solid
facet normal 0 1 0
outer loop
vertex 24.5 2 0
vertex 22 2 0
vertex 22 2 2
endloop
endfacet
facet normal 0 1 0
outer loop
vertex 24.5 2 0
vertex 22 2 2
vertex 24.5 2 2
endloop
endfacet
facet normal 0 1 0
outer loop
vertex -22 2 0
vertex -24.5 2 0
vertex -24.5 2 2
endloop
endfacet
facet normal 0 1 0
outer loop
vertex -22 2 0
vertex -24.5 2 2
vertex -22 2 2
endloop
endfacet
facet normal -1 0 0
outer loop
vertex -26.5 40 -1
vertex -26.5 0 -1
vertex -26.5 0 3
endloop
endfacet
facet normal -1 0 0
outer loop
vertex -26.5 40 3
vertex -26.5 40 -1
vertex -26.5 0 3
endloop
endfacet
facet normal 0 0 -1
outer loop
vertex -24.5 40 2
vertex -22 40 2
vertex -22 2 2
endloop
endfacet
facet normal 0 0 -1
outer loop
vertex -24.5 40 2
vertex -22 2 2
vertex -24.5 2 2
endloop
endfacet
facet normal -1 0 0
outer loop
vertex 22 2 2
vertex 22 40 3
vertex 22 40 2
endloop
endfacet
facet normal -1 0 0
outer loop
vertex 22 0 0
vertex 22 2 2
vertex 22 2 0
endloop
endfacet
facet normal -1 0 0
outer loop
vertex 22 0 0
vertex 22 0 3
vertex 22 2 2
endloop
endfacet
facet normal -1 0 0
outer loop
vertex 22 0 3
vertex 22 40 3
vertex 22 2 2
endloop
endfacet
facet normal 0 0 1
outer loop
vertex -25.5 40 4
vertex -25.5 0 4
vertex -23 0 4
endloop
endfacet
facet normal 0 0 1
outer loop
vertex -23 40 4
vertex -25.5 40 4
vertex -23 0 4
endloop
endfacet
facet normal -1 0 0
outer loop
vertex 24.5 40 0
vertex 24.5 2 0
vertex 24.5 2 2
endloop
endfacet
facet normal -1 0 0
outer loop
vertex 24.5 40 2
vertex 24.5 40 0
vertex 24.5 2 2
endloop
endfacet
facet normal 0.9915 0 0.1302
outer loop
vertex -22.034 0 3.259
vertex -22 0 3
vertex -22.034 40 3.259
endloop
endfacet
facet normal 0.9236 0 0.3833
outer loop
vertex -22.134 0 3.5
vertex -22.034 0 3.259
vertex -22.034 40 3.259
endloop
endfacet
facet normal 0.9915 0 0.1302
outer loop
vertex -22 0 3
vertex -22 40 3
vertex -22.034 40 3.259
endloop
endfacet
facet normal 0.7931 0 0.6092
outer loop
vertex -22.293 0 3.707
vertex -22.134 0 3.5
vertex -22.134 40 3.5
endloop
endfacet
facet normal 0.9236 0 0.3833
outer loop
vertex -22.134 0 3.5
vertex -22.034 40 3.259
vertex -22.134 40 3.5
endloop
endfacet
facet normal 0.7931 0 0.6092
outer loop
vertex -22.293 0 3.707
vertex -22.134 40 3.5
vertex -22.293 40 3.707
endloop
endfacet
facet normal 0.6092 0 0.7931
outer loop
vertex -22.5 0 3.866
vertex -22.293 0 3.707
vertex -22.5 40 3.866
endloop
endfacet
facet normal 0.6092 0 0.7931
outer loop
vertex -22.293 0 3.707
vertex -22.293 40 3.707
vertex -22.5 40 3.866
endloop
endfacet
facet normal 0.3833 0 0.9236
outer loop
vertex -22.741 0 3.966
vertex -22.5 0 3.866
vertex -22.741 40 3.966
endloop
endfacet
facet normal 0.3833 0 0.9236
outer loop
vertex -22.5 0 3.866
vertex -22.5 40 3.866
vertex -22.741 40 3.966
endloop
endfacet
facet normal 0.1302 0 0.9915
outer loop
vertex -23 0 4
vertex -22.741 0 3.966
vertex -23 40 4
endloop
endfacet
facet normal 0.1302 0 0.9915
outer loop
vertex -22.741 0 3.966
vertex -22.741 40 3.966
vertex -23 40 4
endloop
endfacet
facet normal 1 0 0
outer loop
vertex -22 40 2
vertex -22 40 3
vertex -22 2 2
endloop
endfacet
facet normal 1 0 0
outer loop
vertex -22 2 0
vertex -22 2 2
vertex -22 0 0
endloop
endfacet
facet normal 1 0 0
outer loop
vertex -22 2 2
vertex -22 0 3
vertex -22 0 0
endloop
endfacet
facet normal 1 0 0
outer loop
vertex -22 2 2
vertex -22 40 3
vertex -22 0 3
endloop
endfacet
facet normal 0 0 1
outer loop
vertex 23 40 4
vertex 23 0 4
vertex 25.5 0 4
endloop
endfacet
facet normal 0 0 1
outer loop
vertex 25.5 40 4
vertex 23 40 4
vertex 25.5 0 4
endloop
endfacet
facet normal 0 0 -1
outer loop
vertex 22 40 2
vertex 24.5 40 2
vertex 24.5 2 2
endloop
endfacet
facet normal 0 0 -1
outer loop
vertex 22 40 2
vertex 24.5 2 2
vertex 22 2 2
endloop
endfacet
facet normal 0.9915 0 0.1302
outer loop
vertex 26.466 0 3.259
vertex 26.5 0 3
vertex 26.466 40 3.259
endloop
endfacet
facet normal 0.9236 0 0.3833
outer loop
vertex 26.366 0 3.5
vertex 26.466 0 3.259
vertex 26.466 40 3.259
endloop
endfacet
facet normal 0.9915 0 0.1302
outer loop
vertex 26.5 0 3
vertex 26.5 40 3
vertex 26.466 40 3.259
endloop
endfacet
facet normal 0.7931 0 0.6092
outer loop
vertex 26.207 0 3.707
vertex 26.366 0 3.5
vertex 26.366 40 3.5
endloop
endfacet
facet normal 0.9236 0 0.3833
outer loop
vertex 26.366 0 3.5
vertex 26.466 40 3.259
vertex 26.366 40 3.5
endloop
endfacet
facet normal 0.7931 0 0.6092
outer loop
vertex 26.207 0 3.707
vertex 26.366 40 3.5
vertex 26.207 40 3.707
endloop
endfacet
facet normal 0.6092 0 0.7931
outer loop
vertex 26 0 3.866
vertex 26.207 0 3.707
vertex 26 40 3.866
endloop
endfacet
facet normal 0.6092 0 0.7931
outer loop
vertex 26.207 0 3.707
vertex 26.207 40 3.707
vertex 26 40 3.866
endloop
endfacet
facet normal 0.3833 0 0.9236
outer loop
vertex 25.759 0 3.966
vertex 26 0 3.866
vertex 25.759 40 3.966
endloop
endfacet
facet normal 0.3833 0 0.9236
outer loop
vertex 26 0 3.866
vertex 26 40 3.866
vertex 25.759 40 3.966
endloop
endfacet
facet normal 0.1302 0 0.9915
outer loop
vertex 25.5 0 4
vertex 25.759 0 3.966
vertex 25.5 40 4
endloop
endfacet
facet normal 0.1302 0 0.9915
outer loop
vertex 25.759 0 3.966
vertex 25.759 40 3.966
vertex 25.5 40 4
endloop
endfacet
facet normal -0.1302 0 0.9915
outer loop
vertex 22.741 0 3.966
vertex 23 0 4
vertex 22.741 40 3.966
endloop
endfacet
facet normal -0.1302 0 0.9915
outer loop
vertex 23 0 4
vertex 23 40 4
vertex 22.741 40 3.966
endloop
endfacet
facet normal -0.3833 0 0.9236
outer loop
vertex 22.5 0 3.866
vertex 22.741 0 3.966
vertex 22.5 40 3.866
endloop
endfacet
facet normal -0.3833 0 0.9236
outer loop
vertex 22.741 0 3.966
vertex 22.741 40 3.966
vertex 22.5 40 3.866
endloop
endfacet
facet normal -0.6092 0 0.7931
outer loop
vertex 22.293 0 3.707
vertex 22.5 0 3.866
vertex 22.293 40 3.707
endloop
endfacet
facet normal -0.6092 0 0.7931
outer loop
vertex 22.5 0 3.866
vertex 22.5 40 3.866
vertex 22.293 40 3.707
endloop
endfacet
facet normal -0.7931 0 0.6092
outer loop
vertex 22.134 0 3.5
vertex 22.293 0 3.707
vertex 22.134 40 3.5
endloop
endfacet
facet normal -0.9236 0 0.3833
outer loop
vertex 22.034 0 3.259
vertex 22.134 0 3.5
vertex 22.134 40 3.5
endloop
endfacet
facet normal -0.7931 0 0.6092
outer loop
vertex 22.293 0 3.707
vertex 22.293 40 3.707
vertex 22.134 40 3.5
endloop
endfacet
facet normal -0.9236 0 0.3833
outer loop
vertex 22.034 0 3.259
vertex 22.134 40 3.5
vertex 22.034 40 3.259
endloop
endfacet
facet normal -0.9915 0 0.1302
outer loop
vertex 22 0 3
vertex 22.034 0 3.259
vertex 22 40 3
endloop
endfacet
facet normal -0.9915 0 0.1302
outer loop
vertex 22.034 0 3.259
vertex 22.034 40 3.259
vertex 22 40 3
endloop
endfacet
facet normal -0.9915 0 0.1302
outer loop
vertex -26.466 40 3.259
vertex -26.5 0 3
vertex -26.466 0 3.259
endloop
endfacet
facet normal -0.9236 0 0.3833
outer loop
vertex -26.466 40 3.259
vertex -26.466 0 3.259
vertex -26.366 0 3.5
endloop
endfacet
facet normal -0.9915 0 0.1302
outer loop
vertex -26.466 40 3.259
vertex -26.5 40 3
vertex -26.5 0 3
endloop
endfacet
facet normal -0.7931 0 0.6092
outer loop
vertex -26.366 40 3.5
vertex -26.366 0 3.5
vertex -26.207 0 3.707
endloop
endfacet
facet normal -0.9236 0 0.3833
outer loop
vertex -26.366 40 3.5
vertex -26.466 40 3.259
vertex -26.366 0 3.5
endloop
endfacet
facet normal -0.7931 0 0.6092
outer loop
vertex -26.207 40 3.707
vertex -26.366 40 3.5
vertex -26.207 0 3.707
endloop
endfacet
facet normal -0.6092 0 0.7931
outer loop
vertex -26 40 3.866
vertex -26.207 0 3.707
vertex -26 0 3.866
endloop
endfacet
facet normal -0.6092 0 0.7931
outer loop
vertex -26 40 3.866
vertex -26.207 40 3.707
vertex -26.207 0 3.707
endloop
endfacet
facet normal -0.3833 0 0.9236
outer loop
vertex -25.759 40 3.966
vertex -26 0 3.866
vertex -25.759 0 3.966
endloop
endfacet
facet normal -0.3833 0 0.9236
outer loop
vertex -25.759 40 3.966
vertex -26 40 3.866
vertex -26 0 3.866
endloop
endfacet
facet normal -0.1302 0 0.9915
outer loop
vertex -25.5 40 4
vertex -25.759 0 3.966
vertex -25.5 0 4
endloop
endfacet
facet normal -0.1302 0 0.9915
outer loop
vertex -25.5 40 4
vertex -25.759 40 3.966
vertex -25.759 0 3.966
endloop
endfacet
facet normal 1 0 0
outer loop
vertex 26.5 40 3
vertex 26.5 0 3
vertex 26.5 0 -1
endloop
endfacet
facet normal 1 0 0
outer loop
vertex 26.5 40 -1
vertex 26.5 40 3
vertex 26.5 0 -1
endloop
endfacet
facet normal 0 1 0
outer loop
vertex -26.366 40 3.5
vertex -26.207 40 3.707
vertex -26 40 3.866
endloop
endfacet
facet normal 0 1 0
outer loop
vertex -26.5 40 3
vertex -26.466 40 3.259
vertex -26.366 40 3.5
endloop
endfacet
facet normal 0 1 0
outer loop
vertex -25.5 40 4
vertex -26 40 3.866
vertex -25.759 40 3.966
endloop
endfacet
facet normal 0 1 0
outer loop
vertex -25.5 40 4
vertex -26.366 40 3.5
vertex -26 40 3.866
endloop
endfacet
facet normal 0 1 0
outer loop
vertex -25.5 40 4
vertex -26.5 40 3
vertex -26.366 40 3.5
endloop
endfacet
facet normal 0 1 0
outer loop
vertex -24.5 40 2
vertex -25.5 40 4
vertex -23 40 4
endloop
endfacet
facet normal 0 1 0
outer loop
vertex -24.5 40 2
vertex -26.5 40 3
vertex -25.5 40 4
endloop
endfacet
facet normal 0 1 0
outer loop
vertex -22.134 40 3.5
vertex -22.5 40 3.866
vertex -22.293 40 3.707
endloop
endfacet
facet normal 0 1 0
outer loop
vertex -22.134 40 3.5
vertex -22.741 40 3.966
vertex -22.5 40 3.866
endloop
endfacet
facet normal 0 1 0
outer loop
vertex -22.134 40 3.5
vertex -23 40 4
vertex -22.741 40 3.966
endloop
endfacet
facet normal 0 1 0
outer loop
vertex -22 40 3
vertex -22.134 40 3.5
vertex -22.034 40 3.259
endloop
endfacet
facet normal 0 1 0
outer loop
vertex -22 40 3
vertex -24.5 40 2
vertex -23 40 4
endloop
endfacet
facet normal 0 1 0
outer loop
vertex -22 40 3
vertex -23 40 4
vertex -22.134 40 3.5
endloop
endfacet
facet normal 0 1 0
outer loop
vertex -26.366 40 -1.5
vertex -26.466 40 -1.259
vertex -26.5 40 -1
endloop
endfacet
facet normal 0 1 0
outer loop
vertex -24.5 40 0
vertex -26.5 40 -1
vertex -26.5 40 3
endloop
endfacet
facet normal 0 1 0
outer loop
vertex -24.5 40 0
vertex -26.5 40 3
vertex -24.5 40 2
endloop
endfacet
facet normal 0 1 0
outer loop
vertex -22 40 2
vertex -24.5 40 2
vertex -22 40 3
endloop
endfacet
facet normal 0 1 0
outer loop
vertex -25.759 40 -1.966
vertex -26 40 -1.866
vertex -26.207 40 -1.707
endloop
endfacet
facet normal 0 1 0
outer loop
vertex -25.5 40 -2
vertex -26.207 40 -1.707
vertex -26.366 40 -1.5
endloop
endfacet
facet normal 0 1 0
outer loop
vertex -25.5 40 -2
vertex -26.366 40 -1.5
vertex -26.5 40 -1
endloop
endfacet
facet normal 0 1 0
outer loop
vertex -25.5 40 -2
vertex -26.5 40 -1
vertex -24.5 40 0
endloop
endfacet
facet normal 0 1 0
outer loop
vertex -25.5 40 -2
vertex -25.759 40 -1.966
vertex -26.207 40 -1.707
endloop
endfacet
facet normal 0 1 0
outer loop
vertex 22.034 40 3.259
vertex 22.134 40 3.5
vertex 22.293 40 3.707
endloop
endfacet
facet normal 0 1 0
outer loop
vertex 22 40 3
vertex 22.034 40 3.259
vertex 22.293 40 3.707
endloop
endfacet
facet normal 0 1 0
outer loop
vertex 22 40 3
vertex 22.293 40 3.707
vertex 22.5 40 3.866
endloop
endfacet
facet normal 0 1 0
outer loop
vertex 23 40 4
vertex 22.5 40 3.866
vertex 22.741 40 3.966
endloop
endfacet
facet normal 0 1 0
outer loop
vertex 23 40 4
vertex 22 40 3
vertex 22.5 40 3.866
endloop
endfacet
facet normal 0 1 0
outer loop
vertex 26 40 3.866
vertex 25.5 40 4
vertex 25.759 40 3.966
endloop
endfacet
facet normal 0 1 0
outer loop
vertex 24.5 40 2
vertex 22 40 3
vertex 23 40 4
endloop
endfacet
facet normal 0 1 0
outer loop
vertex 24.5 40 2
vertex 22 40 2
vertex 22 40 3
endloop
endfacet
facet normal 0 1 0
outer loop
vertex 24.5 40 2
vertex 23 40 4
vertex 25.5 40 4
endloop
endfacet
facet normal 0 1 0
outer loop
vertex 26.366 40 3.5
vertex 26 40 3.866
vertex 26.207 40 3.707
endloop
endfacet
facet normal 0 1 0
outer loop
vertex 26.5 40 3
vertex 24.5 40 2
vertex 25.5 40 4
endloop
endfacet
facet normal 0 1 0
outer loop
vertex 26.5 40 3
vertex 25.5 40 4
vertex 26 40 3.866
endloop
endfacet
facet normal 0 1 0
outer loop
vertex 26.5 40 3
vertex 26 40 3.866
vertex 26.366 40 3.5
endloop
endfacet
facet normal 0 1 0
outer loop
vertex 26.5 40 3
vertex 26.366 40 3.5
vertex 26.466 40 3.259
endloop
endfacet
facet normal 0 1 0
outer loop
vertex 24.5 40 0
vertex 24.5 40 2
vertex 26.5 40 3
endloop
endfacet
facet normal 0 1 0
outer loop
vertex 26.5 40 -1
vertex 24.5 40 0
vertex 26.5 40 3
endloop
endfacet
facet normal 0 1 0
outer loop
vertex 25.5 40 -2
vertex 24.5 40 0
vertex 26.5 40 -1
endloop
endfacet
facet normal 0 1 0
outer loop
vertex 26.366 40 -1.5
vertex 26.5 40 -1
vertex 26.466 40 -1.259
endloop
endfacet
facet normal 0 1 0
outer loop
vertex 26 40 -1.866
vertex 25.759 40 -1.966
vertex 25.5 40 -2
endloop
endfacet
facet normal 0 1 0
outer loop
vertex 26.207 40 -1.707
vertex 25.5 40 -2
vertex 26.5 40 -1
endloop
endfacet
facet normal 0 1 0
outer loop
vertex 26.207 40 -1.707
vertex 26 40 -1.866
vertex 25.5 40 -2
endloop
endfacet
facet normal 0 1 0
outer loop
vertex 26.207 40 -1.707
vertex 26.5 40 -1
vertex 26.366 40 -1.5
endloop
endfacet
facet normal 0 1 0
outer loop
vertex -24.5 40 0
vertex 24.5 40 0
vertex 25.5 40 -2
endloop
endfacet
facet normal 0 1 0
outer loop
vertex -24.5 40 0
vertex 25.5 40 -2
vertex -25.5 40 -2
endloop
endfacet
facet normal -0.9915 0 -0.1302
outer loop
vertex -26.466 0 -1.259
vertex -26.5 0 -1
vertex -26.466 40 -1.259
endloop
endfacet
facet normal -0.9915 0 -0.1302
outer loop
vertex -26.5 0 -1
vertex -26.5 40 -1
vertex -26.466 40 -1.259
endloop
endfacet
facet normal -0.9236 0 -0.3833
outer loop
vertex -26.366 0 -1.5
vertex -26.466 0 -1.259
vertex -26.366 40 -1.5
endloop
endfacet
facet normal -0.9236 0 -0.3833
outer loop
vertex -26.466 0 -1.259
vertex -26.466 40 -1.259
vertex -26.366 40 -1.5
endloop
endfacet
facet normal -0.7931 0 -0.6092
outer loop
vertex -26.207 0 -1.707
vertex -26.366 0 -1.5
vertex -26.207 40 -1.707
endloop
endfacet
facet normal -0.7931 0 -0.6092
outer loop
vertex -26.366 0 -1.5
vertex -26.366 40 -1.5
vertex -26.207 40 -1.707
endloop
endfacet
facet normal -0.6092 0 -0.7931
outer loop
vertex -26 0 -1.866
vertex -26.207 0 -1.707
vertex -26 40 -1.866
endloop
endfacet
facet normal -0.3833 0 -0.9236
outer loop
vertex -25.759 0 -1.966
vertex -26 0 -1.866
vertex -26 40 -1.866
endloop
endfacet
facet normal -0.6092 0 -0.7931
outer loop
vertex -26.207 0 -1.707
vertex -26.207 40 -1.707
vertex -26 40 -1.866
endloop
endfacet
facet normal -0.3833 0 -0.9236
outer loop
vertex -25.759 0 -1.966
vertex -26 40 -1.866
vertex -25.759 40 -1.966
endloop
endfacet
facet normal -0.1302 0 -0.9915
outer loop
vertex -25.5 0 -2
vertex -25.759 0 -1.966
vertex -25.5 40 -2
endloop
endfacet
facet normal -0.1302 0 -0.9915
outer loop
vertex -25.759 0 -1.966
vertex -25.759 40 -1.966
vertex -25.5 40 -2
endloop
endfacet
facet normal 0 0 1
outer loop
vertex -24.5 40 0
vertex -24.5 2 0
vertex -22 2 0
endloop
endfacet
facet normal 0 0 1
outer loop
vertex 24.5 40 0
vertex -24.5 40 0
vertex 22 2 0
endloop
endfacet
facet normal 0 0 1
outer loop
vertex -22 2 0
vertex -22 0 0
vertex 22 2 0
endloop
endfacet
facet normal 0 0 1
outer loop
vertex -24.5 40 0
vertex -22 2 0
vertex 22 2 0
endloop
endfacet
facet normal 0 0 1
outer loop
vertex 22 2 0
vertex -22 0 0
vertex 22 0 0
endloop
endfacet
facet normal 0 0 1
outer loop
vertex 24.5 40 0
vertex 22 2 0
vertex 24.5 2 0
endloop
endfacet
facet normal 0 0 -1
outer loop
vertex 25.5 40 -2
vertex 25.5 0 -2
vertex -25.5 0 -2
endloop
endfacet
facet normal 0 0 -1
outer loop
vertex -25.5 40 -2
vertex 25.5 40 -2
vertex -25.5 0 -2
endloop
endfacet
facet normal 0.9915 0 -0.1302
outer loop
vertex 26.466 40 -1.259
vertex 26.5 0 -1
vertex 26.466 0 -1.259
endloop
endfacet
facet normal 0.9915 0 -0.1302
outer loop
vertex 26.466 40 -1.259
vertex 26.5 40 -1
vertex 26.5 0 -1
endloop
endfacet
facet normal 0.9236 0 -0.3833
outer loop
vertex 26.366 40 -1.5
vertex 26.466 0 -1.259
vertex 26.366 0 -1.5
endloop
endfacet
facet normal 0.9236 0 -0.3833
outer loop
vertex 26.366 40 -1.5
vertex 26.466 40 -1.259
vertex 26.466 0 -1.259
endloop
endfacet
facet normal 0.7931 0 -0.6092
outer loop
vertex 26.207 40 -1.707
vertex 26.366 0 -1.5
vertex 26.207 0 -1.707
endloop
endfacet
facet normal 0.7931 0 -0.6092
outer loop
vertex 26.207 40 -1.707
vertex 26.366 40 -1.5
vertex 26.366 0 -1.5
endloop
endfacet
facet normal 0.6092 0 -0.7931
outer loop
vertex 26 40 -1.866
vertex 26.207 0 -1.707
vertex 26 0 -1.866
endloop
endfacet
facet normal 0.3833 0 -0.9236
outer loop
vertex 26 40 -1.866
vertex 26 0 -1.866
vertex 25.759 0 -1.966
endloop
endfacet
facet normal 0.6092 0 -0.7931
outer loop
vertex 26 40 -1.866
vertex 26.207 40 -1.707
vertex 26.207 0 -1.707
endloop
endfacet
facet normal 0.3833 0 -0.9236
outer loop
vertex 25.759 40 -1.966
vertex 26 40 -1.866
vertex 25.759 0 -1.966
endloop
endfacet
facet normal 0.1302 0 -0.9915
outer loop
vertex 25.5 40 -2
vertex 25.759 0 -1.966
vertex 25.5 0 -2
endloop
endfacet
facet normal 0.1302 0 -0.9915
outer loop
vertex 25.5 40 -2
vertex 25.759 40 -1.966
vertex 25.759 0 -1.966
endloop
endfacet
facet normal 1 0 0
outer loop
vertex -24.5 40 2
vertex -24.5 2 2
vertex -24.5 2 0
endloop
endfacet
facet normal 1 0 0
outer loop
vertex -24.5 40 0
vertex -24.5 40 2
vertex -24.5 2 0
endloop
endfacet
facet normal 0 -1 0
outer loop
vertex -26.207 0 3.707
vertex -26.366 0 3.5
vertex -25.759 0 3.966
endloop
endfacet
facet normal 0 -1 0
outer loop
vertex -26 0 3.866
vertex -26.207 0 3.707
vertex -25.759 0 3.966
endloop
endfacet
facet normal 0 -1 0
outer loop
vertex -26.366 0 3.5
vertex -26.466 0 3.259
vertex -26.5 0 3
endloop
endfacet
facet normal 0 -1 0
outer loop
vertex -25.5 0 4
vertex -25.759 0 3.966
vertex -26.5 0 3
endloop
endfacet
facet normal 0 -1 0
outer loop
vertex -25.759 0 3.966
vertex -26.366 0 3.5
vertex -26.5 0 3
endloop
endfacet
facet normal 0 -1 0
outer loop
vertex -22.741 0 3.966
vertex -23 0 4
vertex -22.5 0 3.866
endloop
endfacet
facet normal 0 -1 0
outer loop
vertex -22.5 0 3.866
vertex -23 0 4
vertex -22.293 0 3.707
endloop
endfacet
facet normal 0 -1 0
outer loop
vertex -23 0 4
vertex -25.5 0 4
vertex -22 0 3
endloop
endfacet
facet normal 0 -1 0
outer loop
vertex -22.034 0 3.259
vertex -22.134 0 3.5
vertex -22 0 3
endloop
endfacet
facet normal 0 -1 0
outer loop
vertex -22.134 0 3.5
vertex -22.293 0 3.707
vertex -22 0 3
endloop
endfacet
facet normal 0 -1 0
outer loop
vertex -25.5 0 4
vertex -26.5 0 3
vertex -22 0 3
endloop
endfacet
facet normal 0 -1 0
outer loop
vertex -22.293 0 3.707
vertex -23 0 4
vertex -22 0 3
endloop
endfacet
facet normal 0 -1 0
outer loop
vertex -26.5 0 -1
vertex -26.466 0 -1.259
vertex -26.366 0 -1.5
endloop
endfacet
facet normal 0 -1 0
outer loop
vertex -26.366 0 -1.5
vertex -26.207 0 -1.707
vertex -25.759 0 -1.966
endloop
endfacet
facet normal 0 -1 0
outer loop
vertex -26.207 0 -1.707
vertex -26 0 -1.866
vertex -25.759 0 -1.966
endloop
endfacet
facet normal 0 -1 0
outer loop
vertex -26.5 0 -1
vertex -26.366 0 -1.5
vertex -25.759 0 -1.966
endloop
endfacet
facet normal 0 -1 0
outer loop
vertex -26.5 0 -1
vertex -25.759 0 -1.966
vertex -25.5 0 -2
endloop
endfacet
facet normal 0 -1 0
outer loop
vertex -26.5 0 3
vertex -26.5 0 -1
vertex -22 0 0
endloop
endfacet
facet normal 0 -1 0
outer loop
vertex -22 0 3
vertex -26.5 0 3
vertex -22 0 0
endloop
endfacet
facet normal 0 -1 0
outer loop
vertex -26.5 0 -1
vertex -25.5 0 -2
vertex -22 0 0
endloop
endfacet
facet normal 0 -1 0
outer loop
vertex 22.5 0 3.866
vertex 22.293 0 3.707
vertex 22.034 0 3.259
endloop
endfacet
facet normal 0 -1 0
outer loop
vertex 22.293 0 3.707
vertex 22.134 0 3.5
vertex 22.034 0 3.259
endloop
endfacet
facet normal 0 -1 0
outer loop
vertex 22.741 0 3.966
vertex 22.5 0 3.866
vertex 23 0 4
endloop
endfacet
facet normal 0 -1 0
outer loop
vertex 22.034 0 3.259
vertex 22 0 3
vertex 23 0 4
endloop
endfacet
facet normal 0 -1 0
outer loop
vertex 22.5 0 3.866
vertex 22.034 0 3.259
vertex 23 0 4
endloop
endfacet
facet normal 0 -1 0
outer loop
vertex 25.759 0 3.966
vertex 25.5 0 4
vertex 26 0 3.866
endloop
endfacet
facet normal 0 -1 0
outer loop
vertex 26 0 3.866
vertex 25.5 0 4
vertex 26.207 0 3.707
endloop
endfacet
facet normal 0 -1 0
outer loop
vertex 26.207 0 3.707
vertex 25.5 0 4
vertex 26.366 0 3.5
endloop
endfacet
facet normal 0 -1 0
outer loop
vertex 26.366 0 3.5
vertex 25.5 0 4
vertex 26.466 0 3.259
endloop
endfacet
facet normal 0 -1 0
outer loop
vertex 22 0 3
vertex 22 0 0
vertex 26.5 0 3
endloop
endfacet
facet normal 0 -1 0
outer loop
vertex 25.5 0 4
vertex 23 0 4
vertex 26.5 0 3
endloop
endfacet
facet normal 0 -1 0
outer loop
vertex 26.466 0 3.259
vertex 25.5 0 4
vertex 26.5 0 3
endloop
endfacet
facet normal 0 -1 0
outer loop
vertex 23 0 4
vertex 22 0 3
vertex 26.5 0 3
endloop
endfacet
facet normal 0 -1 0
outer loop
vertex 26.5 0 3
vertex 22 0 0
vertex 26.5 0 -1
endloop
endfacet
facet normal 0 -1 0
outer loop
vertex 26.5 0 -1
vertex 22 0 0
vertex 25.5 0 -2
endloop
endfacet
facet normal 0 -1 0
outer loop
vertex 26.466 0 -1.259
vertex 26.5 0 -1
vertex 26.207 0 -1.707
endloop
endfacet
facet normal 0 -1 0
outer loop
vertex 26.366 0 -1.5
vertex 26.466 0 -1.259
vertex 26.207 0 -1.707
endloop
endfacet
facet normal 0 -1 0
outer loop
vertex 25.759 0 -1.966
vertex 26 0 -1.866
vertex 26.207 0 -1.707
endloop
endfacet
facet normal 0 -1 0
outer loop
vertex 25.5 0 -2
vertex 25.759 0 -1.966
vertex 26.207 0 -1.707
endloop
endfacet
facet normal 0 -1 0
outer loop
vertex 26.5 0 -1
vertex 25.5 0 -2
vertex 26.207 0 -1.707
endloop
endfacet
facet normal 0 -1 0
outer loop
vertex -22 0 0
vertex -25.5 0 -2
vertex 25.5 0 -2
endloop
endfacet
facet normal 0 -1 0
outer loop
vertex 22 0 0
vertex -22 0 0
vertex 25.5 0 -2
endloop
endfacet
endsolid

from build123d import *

# Parameters (mm, degrees)
BOSS_EXTRUDE1_DEPTH = 40
SKETCH2_W           = 2.5
SKETCH2_H           = 2
BOSS_EXTRUDE2_DEPTH = 2
FILLET1_R           = 1


with BuildPart() as part:
    # Sketch1 → Boss-Extrude1 (new body)
    with BuildSketch(Plane(origin=(0, 0, 0), x_dir=(1, 0, 0), z_dir=(0, 1, 0))):
        Polygon((26.5, 2), (-26.5, 2), (-26.5, -4), (-22, -4), (-22, -2), (-24.5, -2), (-24.5, 0), (24.5, 0), (24.5, -2), (22, -2), (22, -4), (26.5, -4), align=None)
    extrude(amount=BOSS_EXTRUDE1_DEPTH)

    # Sketch2 → Boss-Extrude2 (add)
    with BuildSketch(Plane(origin=(0, 0, 0), x_dir=(1, 0, 0), z_dir=(0, 1, 0))):
        with Locations((-23.25, -1)):
            Rectangle(SKETCH2_W, SKETCH2_H)
        with Locations((23.25, -1)):
            Rectangle(SKETCH2_W, SKETCH2_H)
    extrude(amount=BOSS_EXTRUDE2_DEPTH)

    # Fillet1
    fillet1_edges = [part.edges().sort_by_distance(p)[0] for p in [
        (22, 20, 4),
        (26.5, 20, 4),
        (26.5, 20, -2),
        (-26.5, 20, -2),
        (-26.5, 20, 4),
        (-22, 20, 4),
    ]]
    fillet(fillet1_edges, radius=FILLET1_R)


solid = part.part
